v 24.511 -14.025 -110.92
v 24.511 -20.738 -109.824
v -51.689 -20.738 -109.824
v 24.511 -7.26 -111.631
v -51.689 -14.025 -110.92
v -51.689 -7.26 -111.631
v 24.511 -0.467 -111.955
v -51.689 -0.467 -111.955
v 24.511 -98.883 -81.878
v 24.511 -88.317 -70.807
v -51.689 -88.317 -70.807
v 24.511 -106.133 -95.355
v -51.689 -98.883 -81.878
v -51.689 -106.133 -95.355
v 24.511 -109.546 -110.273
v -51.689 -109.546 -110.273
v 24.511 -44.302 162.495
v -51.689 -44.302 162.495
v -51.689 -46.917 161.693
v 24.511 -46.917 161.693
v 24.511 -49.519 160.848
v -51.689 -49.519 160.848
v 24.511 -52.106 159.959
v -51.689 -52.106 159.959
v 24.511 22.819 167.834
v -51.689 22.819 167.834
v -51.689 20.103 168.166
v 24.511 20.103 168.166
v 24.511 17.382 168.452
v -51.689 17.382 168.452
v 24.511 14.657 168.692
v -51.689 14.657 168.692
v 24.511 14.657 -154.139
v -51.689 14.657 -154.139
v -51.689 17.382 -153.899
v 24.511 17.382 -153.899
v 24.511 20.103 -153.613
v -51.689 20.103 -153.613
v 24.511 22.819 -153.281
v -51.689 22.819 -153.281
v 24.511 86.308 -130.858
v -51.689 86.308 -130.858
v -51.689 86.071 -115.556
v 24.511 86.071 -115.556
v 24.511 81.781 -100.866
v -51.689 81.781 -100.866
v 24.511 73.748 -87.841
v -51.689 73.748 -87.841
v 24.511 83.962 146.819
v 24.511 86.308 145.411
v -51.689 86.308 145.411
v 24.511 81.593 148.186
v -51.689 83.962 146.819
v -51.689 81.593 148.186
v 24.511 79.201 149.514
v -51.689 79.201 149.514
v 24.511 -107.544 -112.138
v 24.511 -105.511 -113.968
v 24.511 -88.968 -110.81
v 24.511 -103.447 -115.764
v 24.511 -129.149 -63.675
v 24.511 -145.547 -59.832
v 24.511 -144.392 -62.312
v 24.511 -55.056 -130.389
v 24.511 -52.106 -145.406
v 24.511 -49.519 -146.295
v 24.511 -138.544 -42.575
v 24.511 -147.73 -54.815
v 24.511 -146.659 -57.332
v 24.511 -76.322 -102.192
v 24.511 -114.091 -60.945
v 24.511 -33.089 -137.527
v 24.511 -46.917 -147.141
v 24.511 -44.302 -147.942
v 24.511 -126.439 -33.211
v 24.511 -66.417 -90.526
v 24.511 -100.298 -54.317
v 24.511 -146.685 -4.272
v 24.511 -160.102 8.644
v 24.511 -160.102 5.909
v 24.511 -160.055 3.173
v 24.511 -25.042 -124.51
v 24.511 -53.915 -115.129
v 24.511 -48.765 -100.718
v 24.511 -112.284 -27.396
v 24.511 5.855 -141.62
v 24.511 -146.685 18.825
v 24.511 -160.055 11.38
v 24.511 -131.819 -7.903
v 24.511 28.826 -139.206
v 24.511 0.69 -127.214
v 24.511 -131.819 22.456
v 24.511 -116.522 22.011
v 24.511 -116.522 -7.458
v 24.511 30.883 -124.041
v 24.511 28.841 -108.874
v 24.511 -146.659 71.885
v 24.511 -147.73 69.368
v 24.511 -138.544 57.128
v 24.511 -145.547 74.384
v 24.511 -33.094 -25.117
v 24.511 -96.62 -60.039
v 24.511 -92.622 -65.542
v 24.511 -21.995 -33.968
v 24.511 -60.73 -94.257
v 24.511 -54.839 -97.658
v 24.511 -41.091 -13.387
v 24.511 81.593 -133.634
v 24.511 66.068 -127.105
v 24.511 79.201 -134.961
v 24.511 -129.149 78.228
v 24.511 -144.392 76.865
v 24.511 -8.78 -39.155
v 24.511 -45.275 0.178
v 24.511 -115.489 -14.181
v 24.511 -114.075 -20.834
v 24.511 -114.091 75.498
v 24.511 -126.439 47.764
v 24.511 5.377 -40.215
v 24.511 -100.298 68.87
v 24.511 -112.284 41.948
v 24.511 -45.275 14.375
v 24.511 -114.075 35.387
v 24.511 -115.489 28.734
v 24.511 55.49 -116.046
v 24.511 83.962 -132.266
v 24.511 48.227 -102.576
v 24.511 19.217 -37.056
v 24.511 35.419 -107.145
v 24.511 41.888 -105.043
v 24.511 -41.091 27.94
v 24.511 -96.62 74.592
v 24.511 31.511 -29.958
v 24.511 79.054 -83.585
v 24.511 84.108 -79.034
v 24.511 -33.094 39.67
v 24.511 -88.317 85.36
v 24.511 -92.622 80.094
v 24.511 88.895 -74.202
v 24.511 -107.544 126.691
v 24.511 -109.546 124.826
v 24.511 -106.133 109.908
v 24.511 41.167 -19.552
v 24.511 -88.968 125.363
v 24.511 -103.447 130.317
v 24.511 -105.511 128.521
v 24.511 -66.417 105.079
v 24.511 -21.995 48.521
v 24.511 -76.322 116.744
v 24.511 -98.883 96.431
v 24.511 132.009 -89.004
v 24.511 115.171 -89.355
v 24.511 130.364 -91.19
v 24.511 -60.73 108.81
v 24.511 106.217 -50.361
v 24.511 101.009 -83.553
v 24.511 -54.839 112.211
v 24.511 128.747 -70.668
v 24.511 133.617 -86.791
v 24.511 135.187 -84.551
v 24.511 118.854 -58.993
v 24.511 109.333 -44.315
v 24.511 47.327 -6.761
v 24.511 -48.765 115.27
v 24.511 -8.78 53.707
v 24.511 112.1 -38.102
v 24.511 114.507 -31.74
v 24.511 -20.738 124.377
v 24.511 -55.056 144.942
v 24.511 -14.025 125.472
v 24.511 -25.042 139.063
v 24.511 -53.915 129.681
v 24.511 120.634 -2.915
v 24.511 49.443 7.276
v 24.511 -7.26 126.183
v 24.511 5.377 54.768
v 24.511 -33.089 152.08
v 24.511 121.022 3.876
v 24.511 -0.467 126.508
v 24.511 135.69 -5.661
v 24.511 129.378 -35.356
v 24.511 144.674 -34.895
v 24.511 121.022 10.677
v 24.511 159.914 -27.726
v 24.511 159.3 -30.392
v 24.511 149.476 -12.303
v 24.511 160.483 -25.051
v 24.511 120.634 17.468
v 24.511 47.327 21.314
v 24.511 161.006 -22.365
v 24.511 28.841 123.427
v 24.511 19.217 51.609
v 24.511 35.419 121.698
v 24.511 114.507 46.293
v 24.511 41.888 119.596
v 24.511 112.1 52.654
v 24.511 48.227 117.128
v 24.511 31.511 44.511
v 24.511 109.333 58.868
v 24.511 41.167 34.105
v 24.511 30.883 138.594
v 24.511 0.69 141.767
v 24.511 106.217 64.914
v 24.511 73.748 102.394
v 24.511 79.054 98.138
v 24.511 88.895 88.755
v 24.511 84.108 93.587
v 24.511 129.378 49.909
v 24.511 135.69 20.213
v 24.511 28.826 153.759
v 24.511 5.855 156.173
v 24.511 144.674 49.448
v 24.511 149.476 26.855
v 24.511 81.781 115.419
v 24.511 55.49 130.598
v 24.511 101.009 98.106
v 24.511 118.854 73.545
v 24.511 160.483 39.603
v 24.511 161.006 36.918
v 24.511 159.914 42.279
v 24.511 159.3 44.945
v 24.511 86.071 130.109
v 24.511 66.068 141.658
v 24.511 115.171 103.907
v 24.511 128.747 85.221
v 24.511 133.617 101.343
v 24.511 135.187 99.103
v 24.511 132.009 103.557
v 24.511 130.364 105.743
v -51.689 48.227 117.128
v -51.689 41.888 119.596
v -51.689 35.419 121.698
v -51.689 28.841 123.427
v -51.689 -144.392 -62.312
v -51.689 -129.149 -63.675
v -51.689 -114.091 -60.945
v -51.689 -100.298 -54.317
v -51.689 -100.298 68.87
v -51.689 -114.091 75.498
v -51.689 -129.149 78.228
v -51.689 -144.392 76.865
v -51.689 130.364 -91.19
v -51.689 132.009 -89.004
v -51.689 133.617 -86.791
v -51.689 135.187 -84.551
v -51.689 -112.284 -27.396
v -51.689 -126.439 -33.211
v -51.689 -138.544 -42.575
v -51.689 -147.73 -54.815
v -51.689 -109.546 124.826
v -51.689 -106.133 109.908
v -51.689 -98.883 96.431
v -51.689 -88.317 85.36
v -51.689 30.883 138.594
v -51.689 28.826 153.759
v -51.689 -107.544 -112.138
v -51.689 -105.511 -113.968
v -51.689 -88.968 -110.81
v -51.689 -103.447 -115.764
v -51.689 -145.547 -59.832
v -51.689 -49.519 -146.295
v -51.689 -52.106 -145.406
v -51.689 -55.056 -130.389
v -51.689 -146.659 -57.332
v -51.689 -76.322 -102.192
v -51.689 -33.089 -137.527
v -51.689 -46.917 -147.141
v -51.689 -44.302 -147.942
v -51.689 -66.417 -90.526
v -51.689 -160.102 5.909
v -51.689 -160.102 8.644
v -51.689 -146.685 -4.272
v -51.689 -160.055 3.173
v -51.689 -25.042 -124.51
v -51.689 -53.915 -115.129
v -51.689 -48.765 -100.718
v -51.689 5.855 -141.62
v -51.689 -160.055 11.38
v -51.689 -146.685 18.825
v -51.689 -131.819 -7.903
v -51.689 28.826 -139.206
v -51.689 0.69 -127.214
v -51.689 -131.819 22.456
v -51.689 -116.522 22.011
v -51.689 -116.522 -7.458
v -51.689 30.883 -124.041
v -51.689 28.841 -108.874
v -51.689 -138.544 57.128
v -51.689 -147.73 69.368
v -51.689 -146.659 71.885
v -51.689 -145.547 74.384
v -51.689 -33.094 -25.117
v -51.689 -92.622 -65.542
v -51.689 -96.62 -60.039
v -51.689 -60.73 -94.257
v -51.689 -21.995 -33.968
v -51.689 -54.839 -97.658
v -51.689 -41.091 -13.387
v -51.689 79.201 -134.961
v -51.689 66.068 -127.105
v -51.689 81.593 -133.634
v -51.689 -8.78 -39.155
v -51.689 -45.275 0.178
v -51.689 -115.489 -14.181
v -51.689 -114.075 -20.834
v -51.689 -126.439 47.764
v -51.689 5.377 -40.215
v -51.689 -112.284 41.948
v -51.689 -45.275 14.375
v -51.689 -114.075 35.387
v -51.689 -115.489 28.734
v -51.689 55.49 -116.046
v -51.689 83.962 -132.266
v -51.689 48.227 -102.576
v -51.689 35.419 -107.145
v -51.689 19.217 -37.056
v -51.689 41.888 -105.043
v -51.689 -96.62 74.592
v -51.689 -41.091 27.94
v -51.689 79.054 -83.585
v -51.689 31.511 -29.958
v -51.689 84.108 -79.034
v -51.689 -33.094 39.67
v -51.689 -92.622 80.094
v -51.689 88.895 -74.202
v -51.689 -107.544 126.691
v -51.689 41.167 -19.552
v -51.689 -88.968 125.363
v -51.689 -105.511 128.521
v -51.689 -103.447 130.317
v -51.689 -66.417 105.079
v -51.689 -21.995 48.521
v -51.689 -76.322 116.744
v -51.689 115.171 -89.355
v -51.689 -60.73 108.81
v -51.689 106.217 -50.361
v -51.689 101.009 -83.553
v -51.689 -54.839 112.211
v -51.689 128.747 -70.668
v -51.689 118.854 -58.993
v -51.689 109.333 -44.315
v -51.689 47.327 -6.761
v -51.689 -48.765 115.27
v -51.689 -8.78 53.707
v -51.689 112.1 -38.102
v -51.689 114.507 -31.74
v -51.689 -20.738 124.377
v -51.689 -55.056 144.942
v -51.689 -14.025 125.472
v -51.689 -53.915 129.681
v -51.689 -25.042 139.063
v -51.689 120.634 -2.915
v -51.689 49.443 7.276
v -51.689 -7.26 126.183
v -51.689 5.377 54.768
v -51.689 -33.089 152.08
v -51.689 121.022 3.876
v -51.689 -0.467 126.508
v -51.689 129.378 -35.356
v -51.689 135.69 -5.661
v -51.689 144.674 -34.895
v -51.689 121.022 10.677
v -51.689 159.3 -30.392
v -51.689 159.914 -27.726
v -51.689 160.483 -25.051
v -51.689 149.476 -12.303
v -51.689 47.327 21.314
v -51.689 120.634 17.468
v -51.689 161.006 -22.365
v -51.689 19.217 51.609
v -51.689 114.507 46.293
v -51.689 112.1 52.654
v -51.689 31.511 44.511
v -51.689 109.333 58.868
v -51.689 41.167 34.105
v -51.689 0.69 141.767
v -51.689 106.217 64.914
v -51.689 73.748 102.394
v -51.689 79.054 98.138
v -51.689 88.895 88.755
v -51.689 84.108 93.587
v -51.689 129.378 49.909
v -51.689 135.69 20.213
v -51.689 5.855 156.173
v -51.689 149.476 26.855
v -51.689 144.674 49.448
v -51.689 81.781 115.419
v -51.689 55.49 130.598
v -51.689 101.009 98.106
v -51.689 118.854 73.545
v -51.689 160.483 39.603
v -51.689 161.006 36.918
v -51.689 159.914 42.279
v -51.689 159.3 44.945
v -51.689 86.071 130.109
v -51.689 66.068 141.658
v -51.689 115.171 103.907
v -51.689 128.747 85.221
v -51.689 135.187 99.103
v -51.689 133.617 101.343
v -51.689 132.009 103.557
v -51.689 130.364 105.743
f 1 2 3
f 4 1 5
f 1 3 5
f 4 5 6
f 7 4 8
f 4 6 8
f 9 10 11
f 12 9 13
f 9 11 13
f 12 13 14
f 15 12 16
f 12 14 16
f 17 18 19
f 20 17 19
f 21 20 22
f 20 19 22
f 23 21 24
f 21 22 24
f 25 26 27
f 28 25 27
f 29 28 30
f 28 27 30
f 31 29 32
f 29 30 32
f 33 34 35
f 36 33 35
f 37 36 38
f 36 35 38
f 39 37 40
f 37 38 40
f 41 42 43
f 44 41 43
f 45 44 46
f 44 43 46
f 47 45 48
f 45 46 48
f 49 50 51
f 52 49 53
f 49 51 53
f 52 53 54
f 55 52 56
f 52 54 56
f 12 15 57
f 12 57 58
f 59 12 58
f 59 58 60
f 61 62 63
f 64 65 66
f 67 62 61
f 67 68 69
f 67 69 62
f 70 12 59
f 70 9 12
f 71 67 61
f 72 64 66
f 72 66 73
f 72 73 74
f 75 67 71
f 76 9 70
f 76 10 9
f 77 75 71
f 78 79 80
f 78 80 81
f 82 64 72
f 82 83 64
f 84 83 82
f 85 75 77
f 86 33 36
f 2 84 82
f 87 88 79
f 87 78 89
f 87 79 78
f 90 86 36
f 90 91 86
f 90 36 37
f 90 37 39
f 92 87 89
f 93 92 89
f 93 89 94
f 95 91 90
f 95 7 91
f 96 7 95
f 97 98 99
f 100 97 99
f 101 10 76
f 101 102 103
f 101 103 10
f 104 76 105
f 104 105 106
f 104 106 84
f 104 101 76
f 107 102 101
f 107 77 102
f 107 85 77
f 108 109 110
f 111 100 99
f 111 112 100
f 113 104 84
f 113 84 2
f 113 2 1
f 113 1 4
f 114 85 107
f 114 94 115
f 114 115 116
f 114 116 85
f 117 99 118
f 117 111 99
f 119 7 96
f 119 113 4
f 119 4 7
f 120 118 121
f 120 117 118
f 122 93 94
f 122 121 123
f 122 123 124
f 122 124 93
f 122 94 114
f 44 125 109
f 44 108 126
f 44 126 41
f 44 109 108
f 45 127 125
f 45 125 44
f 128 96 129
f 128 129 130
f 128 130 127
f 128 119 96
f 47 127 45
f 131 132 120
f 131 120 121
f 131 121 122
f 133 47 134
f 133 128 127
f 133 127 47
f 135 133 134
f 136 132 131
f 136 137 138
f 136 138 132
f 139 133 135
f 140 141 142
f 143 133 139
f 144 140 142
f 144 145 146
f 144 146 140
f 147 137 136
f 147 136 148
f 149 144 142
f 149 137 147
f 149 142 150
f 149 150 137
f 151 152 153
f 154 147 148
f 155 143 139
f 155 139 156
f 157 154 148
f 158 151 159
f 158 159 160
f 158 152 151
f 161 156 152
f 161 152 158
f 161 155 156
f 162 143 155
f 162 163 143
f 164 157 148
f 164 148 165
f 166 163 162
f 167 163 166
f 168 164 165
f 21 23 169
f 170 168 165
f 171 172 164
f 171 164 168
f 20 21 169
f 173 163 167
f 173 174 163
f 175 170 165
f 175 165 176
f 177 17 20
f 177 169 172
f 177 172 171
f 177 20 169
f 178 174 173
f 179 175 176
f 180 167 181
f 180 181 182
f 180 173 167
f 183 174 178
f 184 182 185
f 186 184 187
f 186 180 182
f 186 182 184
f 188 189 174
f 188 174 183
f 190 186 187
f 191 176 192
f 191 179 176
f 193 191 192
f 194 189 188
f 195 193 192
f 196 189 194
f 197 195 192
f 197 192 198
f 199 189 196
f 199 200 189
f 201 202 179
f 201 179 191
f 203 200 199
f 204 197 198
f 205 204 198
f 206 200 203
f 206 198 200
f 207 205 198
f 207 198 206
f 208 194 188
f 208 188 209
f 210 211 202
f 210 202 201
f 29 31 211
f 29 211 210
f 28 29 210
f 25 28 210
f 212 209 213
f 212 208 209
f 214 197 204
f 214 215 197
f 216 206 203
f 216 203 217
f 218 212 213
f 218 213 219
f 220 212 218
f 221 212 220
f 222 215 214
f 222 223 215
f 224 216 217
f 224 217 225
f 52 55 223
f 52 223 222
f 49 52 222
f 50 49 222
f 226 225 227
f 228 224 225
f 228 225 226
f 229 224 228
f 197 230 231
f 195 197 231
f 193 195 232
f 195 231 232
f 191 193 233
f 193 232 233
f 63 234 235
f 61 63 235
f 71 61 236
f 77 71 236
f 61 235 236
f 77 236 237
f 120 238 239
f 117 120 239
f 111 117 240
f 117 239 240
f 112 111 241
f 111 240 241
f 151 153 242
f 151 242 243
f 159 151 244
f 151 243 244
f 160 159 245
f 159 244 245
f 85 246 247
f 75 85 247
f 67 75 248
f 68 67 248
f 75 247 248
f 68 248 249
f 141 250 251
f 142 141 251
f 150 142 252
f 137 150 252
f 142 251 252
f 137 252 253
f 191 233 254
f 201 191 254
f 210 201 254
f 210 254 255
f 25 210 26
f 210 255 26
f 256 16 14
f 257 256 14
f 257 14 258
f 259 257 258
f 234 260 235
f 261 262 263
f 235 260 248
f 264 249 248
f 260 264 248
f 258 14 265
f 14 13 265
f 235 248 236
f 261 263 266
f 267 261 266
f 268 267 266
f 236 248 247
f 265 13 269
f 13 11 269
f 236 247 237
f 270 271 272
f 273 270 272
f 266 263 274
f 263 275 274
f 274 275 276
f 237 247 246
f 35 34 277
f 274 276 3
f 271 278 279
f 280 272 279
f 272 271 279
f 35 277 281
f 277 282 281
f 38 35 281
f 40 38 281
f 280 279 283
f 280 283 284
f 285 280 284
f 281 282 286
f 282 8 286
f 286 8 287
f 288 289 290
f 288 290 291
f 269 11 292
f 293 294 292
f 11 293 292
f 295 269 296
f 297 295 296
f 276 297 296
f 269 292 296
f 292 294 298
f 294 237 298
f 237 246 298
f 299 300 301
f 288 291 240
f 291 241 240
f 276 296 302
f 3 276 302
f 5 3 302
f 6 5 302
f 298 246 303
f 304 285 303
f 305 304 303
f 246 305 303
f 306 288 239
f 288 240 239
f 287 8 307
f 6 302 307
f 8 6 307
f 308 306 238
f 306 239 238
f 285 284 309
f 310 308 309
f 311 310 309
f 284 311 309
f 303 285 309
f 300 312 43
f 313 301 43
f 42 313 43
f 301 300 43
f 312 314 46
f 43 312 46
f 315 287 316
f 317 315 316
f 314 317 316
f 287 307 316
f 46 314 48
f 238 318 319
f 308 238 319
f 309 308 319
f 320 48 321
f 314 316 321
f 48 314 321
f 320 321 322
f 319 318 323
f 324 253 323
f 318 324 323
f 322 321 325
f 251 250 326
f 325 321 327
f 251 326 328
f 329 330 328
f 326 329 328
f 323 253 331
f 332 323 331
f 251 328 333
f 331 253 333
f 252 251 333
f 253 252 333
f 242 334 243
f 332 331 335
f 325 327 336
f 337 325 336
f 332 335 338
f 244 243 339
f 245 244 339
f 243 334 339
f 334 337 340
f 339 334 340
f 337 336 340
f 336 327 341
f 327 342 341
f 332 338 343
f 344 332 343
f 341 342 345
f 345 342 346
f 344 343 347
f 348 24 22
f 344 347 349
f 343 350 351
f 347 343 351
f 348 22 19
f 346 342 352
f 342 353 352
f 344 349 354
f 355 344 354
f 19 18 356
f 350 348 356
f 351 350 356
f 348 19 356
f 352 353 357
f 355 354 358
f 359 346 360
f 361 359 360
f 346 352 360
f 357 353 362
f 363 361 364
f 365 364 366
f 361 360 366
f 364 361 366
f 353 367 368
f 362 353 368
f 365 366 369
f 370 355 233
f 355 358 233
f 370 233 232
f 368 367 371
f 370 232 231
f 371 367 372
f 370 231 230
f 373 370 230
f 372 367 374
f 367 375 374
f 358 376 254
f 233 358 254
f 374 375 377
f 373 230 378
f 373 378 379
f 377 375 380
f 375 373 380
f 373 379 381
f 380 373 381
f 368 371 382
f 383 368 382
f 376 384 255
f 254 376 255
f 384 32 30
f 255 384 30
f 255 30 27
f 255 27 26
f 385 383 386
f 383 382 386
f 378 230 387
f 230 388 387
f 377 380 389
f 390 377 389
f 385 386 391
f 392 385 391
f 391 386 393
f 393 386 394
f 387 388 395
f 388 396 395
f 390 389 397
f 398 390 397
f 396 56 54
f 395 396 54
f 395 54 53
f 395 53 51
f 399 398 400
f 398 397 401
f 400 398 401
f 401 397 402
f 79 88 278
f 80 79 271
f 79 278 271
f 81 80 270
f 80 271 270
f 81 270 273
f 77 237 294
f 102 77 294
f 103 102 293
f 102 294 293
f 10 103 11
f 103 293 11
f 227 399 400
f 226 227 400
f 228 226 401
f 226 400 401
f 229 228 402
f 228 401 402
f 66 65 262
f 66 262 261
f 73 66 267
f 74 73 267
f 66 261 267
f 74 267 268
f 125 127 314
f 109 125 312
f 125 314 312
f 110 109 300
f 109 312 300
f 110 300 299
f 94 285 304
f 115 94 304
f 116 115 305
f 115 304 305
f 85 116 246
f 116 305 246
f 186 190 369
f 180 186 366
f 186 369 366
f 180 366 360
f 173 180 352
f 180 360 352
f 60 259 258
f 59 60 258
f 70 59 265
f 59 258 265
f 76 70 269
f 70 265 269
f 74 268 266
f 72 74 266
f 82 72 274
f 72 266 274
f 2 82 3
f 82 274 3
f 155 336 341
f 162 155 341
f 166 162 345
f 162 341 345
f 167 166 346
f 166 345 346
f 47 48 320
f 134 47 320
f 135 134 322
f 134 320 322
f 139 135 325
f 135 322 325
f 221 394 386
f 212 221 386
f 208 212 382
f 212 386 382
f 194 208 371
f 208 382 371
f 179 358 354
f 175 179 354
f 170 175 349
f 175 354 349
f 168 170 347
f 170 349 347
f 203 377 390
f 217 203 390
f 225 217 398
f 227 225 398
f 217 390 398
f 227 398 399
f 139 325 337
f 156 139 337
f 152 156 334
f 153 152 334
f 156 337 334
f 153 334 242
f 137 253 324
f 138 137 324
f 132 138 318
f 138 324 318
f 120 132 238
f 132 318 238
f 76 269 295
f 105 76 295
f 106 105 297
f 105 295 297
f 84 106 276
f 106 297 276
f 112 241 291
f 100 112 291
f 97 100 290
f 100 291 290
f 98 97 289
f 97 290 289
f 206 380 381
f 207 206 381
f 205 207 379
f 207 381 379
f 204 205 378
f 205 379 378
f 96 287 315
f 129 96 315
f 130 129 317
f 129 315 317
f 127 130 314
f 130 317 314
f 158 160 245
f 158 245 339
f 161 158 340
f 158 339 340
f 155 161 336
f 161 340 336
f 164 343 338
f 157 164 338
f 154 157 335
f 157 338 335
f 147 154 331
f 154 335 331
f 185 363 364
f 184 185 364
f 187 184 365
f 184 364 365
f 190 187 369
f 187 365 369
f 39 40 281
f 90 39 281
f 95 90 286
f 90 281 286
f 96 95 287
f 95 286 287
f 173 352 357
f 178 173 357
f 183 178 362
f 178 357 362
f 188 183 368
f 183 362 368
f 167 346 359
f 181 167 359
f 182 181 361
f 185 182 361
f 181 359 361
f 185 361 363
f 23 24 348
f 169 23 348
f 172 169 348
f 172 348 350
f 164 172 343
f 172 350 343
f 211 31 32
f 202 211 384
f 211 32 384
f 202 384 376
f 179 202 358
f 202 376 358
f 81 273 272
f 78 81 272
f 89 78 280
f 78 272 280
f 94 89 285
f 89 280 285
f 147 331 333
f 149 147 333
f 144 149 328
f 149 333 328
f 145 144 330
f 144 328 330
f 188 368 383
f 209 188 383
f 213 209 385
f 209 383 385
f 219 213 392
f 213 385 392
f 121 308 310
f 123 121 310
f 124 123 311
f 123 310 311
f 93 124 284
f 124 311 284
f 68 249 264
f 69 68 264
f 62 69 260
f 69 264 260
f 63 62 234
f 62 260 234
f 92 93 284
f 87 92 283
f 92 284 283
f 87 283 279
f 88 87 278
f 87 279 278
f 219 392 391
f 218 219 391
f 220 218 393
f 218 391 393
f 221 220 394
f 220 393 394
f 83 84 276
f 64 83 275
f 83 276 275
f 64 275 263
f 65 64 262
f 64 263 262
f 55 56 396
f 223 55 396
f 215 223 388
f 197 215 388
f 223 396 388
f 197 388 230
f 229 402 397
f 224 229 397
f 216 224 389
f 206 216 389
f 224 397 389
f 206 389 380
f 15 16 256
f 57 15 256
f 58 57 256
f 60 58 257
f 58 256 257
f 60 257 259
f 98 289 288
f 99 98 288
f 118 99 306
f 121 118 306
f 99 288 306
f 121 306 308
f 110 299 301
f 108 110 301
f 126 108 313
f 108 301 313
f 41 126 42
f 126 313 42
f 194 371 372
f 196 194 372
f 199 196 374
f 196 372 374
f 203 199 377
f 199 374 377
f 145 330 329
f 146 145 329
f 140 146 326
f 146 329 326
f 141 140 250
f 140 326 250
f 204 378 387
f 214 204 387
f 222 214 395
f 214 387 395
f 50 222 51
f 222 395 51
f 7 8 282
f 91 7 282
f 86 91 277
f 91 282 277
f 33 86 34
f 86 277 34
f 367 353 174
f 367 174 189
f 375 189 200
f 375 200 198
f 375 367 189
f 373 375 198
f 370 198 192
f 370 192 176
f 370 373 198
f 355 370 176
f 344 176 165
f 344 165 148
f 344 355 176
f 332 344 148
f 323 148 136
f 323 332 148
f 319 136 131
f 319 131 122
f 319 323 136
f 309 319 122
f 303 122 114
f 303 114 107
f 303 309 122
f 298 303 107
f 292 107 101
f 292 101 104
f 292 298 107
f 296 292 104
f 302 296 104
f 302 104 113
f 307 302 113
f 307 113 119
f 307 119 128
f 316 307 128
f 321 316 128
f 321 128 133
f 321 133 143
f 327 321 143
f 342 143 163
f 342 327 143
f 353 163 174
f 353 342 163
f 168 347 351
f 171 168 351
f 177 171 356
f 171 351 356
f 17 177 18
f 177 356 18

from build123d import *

# Parameters (mm, degrees)
SPUR_START             = -16.129320455
SPUR_GEAR_AI_OUTLINE_R = 3.175
SPUR_GEAR_AI_DEPTH     = 5.08
SCALE1_SCALE           = 15


# Read off the part's stored shape, not the designer's step: spur gear_ai
with BuildPart() as part:
    # spur gear_ai outline → spur gear_ai (new body)
    with BuildSketch(Plane.YZ.offset(SPUR_START)):
        with BuildLine():
            ThreePointArc((3.217647432, 17.980210444), (2.945962103, 18.012251215), (2.673552099, 18.037397168))
            ThreePointArc((2.673552099, 18.037397168), (1.882282705, 16.734209467), (1.665300635, 15.22512888))
            ThreePointArc((1.665300635, 15.22512888), (0.986555153, 15.183035327), (0.313890146, 15.083089914))
            ThreePointArc((0.313890146, 15.083089914), (-0.212105842, 16.514080361), (-1.257032059, 17.624276126))
            ThreePointArc((-1.257032059, 17.624276126), (-1.518261113, 17.543042448), (-1.777347815, 17.455215289))
            ThreePointArc((-1.777347815, 17.455215289), (-1.970154185, 15.942855827), (-1.554578797, 14.475987553))
            ThreePointArc((-1.554578797, 14.475987553), (-2.157522658, 14.161462519), (-2.731381258, 13.796560335))
            ThreePointArc((-2.731381258, 13.796560335), (-3.793938754, 14.889893315), (-5.200083652, 15.479097832))
            ThreePointArc((-5.200083652, 15.479097832), (-5.405687554, 15.298635745), (-5.60665251, 15.113021587))
            ThreePointArc((-5.60665251, 15.113021587), (-5.167657883, 13.652991056), (-4.191381798, 12.481969945))
            ThreePointArc((-4.191381798, 12.481969945), (-4.614269567, 11.949397667), (-4.990096395, 11.382633613))
            ThreePointArc((-4.990096395, 11.382633613), (-6.405489555, 11.949261922), (-7.929717906, 11.915596376))
            ThreePointArc((-7.929717906, 11.915596376), (-8.044145874, 11.667109416), (-8.152240417, 11.415802634))
            ThreePointArc((-8.152240417, 11.415802634), (-7.157350952, 10.260553574), (-5.789181173, 9.587859815))
            ThreePointArc((-5.789181173, 9.587859815), (-5.958891714, 8.929326879), (-6.071702896, 8.25869961))
            ThreePointArc((-6.071702896, 8.25869961), (-7.595197385, 8.200648065), (-8.973956261, 7.549933535))
            ThreePointArc((-8.973956261, 7.549933535), (-8.977422659, 7.276387354), (-8.973956261, 7.002841173))
            ThreePointArc((-8.973956261, 7.002841173), (-7.595197384, 6.352126644), (-6.071702896, 6.294075099))
            ThreePointArc((-6.071702896, 6.294075099), (-5.958891714, 5.62344783), (-5.789181173, 4.964914893))
            ThreePointArc((-5.789181173, 4.964914893), (-7.157350952, 4.292221134), (-8.152240417, 3.136972074))
            ThreePointArc((-8.152240417, 3.136972074), (-8.044145874, 2.885665292), (-7.929717906, 2.637178332))
            ThreePointArc((-7.929717906, 2.637178332), (-6.405489555, 2.603512786), (-4.990096395, 3.170141095))
            ThreePointArc((-4.990096395, 3.170141095), (-4.614269567, 2.603377042), (-4.191381798, 2.070804764))
            ThreePointArc((-4.191381798, 2.070804764), (-5.167657883, 0.899783653), (-5.60665251, -0.560246879))
            ThreePointArc((-5.60665251, -0.560246879), (-5.405687554, -0.745861037), (-5.200083652, -0.926323123))
            ThreePointArc((-5.200083652, -0.926323123), (-3.793938754, -0.337118607), (-2.731381258, 0.756214373))
            ThreePointArc((-2.731381258, 0.756214373), (-2.157522658, 0.391312189), (-1.554578797, 0.076787156))
            ThreePointArc((-1.554578797, 0.076787156), (-1.970154185, -1.390081118), (-1.777347815, -2.90244058))
            ThreePointArc((-1.777347815, -2.90244058), (-1.518261113, -2.990267739), (-1.257032059, -3.071501418))
            ThreePointArc((-1.257032059, -3.071501418), (-0.212105842, -1.961305652), (0.313890146, -0.530315206))
            ThreePointArc((0.313890146, -0.530315206), (0.986555153, -0.630260618), (1.665300635, -0.672354172))
            ThreePointArc((1.665300635, -0.672354172), (1.882282705, -2.181434759), (2.673552099, -3.48462246))
            ThreePointArc((2.673552099, -3.48462246), (2.945962103, -3.459476506), (3.217647432, -3.427435736))
            ThreePointArc((3.217647432, -3.427435736), (3.720677732, -1.988211655), (3.619162727, -0.466994991))
            ThreePointArc((3.619162727, -0.466994991), (4.27432425, -0.284702162), (4.911510093, -0.047085877))
            ThreePointArc((4.911510093, -0.047085877), (5.723531449, -1.337445034), (6.976446201, -2.206127982))
            ThreePointArc((6.976446201, -2.206127982), (7.215077342, -2.07235688), (7.450242085, -1.932581801))
            ThreePointArc((7.450242085, -1.932581801), (7.324397959, -0.413184324), (6.612924828, 0.935226378))
            ThreePointArc((6.612924828, 0.935226378), (7.137299488, 1.368237363), (7.62275047, 1.844477471))
            ThreePointArc((7.62275047, 1.844477471), (8.889405244, 0.995954565), (10.38732501, 0.711979544))
            ThreePointArc((10.38732501, 0.711979544), (10.550915796, 0.931245556), (10.708897832, 1.154586562))
            ThreePointArc((10.708897832, 1.154586562), (9.975938874, 2.491439809), (8.777527784, 3.433892087))
            ThreePointArc((8.777527784, 3.433892087), (9.080446439, 4.042749694), (9.330223676, 4.675267385))
            ThreePointArc((9.330223676, 4.675267385), (10.832495749, 4.415298049), (12.316416594, 4.765132816))
            ThreePointArc((12.316416594, 4.765132816), (12.376680691, 5.031980652), (12.430163492, 5.300269897))
            ThreePointArc((12.430163492, 5.300269897), (11.216824963, 6.223424842), (9.73869208, 6.596960136))
            ThreePointArc((9.73869208, 6.596960136), (9.767777341, 7.276387354), (9.73869208, 7.955814572))
            ThreePointArc((9.73869208, 7.955814572), (11.216824963, 8.329349866), (12.430163492, 9.252504811))
            ThreePointArc((12.430163492, 9.252504811), (12.376680691, 9.520794056), (12.316416594, 9.787641893))
            ThreePointArc((12.316416594, 9.787641893), (10.832495749, 10.137476659), (9.330223676, 9.877507324))
            ThreePointArc((9.330223676, 9.877507324), (9.080446439, 10.510025014), (8.777527784, 11.118882621))
            ThreePointArc((8.777527784, 11.118882621), (9.975938874, 12.061334899), (10.708897832, 13.398188146))
            ThreePointArc((10.708897832, 13.398188146), (10.550915796, 13.621529153), (10.38732501, 13.840795164))
            ThreePointArc((10.38732501, 13.840795164), (8.889405244, 13.556820143), (7.62275047, 12.708297238))
            ThreePointArc((7.62275047, 12.708297238), (7.137299488, 13.184537346), (6.612924828, 13.61754833))
            ThreePointArc((6.612924828, 13.61754833), (7.324397959, 14.965959032), (7.450242085, 16.485356509))
            ThreePointArc((7.450242085, 16.485356509), (7.215077342, 16.625131588), (6.976446201, 16.75890269))
            ThreePointArc((6.976446201, 16.75890269), (5.723531449, 15.890219742), (4.911510093, 14.599860585))
            ThreePointArc((4.911510093, 14.599860585), (4.27432425, 14.83747687), (3.619162727, 15.019769699))
            ThreePointArc((3.619162727, 15.019769699), (3.720677732, 16.540986364), (3.217647432, 17.980210444))
        make_face()
        with Locations((1.817577341, 7.276387354)):
            Circle(SPUR_GEAR_AI_OUTLINE_R, mode=Mode.SUBTRACT)
    extrude(amount=SPUR_GEAR_AI_DEPTH)


with BuildPart() as part_1:
    # Scale1: scaled about (-13.589320455, 1.817577341, 7.276387354)
    add(part.part.scale(SCALE1_SCALE).moved(Location((190.25048637, -25.446082774, -101.869422956))))


solid = part_1.part
